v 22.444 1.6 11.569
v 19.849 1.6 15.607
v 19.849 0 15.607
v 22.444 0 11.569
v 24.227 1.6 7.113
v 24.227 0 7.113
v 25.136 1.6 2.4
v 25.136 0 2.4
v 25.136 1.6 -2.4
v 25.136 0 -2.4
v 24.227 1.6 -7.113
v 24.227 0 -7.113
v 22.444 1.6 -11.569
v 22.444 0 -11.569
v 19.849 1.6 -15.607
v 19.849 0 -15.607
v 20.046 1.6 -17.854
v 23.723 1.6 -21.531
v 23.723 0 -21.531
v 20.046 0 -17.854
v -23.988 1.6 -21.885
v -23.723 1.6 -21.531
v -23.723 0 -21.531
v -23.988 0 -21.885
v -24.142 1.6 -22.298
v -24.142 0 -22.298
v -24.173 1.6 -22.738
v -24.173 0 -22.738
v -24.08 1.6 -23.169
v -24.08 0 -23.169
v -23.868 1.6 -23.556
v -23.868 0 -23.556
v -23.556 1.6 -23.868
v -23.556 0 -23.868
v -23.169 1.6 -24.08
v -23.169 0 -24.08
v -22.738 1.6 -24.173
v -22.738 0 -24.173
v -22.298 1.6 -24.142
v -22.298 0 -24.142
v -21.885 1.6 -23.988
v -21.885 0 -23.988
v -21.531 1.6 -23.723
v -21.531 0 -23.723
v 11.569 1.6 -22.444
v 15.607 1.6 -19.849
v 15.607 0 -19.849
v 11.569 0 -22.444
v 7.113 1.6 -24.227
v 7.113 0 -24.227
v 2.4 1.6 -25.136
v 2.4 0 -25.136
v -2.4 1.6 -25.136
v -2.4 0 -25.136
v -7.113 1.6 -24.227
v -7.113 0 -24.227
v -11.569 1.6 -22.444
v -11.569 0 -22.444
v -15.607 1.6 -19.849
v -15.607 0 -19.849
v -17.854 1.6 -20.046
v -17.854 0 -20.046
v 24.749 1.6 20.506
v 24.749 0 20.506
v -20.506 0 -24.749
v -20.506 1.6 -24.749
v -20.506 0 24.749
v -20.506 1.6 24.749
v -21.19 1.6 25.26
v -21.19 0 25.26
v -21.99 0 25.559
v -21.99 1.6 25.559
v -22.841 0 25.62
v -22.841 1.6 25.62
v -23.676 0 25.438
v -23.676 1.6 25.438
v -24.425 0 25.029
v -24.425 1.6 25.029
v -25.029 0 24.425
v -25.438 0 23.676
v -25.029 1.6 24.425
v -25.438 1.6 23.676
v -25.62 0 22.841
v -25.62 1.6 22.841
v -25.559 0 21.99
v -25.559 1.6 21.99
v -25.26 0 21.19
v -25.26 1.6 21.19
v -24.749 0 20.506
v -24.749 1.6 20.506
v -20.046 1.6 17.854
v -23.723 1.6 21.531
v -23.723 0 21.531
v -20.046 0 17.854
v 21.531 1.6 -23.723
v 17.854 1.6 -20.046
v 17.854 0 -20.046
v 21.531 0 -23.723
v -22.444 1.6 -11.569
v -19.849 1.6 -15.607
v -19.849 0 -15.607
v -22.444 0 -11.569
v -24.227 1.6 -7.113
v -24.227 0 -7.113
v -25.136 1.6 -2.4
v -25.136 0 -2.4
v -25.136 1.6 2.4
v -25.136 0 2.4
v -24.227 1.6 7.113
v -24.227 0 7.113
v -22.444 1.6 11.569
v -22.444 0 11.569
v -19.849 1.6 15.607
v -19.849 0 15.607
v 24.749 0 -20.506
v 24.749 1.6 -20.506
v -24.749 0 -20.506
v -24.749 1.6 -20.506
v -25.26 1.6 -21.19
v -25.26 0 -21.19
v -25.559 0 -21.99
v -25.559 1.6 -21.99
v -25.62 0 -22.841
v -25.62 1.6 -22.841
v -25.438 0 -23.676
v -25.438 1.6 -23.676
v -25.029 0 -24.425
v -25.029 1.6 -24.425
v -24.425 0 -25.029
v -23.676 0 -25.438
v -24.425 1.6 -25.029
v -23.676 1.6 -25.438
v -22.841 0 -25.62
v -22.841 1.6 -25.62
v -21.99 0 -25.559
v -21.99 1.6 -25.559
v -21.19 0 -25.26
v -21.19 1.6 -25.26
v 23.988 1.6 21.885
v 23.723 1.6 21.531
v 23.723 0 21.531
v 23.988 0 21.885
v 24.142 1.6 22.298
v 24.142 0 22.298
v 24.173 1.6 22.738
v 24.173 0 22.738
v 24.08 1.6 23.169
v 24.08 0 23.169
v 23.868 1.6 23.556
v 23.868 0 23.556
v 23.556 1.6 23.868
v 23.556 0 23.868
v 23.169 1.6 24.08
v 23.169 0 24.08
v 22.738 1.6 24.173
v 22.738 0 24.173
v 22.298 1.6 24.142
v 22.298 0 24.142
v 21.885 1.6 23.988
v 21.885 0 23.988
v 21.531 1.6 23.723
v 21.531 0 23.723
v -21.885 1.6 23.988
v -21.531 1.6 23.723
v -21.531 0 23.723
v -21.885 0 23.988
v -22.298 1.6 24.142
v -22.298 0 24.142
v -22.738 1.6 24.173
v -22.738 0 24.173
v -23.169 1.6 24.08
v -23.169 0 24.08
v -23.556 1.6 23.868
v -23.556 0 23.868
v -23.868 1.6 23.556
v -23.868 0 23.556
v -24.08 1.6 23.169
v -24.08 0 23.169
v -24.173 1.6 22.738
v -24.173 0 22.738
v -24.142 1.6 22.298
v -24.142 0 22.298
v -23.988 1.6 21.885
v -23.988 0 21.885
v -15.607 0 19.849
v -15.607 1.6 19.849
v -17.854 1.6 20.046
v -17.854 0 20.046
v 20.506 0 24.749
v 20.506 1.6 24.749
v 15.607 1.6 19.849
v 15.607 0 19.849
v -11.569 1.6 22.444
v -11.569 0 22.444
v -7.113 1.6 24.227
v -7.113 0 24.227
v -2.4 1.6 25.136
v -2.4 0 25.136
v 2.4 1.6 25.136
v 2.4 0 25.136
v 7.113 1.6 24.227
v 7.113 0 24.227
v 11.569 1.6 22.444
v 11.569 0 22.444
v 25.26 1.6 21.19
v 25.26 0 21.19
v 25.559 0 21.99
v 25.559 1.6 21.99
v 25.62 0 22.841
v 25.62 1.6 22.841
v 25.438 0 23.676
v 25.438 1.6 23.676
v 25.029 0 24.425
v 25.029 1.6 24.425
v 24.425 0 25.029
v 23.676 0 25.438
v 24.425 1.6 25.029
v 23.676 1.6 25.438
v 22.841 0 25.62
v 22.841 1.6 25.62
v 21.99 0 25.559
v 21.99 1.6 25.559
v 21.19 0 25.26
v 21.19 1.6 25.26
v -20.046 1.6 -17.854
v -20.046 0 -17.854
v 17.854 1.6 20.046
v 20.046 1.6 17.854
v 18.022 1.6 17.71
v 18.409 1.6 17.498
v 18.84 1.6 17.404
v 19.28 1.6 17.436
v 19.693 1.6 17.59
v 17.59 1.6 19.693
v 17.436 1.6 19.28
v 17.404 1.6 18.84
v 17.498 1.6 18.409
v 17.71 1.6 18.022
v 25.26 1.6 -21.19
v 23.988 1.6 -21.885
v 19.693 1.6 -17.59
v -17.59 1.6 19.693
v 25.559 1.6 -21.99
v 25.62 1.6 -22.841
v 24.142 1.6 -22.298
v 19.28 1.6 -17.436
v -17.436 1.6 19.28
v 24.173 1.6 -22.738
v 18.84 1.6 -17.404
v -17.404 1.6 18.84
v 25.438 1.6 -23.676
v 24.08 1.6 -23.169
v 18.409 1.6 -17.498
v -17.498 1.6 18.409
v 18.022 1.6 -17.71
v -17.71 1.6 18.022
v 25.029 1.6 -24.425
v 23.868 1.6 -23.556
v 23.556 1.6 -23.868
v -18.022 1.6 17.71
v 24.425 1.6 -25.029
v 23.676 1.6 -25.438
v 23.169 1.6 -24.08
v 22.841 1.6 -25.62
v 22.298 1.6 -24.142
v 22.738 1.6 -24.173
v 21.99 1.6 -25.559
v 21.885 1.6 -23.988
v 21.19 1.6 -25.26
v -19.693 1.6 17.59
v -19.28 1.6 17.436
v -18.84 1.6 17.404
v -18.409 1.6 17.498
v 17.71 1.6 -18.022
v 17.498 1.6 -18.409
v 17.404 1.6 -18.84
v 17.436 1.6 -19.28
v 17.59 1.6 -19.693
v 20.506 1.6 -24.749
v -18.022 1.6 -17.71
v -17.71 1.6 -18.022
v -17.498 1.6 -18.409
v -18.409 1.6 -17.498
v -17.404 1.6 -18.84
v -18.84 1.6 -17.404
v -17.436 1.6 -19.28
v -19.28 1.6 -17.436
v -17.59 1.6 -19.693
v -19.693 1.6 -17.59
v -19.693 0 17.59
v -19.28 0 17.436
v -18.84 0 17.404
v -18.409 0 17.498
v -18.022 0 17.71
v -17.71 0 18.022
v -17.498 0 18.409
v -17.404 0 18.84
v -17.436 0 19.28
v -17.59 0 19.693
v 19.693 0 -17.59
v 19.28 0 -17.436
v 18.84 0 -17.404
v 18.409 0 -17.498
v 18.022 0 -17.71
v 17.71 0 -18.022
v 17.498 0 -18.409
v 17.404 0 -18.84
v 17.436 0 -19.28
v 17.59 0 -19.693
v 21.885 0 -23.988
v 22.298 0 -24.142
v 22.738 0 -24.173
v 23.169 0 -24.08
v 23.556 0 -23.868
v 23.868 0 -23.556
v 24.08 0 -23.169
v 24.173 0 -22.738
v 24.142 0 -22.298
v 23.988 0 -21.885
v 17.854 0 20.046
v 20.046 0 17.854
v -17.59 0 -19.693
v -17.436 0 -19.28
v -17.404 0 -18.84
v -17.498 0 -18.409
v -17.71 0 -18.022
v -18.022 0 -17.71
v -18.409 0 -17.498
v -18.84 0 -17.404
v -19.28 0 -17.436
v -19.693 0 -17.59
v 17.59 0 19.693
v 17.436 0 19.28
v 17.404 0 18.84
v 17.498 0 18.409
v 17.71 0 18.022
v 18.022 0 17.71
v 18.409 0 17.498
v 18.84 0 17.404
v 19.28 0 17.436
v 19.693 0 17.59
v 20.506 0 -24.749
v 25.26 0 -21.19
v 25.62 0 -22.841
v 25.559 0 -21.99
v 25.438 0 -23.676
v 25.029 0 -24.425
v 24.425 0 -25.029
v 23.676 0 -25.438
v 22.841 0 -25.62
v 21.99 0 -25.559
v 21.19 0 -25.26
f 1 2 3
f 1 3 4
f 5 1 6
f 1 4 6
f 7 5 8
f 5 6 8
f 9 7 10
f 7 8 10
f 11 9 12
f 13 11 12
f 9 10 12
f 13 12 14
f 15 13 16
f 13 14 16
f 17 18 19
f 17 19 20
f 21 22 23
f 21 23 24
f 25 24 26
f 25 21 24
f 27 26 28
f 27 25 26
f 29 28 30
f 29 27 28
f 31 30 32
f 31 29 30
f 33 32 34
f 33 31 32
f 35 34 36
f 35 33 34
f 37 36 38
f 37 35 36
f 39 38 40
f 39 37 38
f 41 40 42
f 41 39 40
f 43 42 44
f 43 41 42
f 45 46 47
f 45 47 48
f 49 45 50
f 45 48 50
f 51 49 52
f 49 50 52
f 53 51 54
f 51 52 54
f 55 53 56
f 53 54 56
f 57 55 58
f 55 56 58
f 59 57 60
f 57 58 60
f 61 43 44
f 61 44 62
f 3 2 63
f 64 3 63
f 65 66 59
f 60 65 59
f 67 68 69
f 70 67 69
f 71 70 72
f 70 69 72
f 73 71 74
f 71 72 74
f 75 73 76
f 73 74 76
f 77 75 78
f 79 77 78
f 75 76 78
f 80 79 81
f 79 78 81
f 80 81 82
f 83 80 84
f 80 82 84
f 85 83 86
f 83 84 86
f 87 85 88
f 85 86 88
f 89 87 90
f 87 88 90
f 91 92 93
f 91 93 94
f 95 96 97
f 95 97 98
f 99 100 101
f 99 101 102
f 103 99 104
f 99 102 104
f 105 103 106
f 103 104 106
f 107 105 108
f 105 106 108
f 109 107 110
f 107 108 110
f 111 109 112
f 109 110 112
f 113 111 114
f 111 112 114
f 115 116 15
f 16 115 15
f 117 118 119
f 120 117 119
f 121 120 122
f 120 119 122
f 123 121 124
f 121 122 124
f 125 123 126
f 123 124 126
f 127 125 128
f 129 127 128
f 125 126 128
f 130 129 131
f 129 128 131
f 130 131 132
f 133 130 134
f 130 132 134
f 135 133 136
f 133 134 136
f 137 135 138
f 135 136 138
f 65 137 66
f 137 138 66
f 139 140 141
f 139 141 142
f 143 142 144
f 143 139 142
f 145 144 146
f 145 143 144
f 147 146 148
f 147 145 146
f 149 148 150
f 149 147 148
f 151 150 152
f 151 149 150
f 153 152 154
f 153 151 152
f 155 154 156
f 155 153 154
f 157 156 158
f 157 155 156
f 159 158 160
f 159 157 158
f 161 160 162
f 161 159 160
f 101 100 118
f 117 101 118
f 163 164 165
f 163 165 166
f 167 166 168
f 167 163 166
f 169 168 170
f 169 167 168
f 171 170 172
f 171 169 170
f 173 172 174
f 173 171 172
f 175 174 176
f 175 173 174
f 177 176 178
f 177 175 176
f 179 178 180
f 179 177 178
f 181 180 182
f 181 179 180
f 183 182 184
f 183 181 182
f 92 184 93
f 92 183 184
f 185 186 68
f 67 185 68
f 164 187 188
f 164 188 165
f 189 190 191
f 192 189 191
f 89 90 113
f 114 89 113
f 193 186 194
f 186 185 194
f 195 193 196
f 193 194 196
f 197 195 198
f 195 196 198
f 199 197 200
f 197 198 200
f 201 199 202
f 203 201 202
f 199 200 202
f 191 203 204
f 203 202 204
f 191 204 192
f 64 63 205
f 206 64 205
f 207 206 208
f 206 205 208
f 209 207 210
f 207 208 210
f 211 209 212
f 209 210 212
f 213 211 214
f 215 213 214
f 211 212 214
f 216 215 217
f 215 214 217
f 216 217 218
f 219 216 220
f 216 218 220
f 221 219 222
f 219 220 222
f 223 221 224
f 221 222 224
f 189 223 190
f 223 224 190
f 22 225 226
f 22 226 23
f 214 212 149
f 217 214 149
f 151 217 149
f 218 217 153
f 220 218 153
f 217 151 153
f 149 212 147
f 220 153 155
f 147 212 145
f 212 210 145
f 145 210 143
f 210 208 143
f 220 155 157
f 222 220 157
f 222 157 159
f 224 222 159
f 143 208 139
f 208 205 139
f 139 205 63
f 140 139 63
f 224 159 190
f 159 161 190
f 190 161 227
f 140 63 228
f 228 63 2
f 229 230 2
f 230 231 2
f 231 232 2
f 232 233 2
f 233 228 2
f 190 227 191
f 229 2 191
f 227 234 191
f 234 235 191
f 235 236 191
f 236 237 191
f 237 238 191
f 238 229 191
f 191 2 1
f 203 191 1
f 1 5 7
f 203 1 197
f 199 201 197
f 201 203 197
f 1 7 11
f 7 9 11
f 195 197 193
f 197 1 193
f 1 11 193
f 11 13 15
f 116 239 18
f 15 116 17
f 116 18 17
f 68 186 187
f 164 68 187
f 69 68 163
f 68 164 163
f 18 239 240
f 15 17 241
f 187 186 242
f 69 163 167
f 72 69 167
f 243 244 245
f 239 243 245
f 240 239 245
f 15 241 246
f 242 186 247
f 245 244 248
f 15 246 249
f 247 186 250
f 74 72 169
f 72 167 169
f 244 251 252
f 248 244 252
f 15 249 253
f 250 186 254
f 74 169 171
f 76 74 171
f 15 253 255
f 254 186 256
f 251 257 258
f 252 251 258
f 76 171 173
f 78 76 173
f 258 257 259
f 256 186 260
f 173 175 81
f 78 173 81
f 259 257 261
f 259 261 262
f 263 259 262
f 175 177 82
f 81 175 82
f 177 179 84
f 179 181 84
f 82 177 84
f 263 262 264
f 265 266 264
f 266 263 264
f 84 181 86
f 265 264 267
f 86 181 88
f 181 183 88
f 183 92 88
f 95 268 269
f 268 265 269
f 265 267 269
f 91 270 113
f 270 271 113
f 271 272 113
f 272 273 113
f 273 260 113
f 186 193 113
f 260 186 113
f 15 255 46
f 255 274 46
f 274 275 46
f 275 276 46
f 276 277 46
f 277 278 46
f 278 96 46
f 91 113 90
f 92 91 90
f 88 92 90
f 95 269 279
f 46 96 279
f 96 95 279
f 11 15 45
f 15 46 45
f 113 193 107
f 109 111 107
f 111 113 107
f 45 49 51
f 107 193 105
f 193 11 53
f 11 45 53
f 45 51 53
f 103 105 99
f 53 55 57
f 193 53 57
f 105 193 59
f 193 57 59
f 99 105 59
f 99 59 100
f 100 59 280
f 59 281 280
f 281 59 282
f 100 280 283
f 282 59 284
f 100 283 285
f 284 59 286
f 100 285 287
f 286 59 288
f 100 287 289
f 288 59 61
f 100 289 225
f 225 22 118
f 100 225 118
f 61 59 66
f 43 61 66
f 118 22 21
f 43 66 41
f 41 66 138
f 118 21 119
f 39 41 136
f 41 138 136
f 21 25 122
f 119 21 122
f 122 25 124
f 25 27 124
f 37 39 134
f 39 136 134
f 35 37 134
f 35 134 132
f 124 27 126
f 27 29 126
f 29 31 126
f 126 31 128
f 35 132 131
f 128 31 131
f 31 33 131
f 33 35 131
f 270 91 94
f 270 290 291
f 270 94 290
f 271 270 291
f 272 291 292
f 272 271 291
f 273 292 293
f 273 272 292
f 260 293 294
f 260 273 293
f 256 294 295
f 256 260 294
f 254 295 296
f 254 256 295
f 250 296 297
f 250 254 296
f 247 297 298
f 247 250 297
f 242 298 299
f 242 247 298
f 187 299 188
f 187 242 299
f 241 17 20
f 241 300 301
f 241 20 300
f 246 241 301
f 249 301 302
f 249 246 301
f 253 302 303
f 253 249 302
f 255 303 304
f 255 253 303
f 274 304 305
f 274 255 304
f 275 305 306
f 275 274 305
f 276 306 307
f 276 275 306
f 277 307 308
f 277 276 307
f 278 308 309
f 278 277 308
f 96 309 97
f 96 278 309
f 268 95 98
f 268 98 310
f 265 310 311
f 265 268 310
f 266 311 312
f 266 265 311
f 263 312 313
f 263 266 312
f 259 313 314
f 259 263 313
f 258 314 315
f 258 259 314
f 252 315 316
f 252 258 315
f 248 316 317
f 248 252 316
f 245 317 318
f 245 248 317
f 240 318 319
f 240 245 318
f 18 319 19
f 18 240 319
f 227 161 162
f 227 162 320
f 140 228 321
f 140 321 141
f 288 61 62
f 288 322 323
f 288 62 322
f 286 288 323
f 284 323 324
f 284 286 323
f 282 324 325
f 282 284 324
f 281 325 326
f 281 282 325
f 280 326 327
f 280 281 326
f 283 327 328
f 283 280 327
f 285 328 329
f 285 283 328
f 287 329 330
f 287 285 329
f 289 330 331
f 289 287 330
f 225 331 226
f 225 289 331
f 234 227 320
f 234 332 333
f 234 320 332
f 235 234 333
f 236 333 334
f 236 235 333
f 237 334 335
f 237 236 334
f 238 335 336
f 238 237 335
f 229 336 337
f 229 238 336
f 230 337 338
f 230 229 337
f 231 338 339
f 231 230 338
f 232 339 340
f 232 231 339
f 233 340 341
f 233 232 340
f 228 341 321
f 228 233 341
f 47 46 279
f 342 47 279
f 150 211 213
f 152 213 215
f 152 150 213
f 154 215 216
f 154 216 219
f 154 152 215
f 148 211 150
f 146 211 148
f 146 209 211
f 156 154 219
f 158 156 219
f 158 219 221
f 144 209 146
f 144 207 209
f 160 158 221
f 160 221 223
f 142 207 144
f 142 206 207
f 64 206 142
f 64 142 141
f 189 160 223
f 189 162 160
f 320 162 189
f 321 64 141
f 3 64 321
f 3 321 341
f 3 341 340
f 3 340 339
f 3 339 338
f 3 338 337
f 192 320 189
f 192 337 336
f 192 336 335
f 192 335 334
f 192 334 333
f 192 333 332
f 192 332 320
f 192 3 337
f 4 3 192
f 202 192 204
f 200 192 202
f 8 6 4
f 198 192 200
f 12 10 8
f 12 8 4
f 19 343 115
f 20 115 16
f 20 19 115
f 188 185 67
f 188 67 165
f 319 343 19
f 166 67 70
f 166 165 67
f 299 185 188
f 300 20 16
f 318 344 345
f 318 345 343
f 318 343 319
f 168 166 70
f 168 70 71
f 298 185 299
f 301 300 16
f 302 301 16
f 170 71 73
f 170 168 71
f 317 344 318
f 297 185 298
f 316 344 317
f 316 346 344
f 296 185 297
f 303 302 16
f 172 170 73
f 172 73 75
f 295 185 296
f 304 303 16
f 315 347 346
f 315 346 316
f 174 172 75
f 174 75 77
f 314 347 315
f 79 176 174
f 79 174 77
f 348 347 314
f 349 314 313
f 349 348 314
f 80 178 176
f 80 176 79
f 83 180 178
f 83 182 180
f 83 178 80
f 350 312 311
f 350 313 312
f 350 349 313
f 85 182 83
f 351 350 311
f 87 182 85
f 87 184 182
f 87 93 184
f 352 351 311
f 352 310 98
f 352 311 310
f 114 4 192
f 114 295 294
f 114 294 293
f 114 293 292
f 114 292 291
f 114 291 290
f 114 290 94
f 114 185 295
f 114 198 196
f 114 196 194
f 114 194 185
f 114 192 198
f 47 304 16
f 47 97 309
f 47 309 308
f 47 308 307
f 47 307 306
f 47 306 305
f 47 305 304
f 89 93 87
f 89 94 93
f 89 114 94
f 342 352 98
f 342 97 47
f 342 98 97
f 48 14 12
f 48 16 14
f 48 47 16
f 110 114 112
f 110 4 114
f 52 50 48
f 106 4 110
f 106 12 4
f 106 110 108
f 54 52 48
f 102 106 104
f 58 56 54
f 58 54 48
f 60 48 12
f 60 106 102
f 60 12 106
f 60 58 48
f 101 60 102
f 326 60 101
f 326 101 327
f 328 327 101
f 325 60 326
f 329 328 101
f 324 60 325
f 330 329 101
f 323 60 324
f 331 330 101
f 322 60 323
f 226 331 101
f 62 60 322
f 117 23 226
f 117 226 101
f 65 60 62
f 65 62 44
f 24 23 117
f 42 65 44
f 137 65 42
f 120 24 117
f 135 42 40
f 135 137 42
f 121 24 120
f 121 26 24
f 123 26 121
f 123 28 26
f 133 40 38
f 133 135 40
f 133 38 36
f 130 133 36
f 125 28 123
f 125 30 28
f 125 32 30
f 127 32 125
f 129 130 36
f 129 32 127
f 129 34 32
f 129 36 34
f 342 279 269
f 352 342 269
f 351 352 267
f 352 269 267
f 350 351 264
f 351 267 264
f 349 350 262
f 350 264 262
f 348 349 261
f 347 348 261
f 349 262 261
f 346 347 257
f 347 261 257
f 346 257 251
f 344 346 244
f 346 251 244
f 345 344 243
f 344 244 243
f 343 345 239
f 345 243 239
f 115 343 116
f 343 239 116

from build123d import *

# Parameters (mm, degrees)
SKETCH_1_R      = 25.25
EXTRUDE_1_DEPTH = 1.6
EXTRUDE_2_DEPTH = 1.6


with BuildPart() as part:
    # 草图1 → 凸台-拉伸1 (new body)
    with BuildSketch(Plane(origin=(0, 0, 0), x_dir=(1, 0, 0), z_dir=(0, 1, 0))):
        with Locations(Location((0, 0, 0), (0, 0, 270))):
            Circle(SKETCH_1_R)
    extrude(amount=EXTRUDE_1_DEPTH)

    # 草图2 → 凸台-拉伸2 (add)
    with BuildSketch(Plane(origin=(0, 1.6, 0), x_dir=(1, 0, 0), z_dir=(0, 1, 0))):
        with BuildLine():
            Line((-20.506096654, 24.748737342), (0, 4.242640687))
            Line((0, 4.242640687), (20.506096654, 24.748737342))
            ThreePointArc((20.506096654, 24.748737342), (24.748737342, 24.748737342), (24.748737342, 20.506096654))
            Line((24.748737342, 20.506096654), (4.242640687, 0))
            Line((4.242640687, 0), (24.748737342, -20.506096654))
            ThreePointArc((24.748737342, -20.506096654), (24.748737342, -24.748737342), (20.506096654, -24.748737342))
            Line((20.506096654, -24.748737342), (0, -4.242640687))
            Line((0, -4.242640687), (-20.506096654, -24.748737342))
            ThreePointArc((-20.506096654, -24.748737342), (-24.748737342, -24.748737342), (-24.748737342, -20.506096654))
            Line((-24.748737342, -20.506096654), (-4.242640687, 0))
            Line((-4.242640687, 0), (-24.748737342, 20.506096654))
            ThreePointArc((-24.748737342, 20.506096654), (-24.748737342, 24.748737342), (-20.506096654, 24.748737342))
        make_face()
        with BuildLine():
            Line((-21.531401487, 23.723432509), (-17.854446225, 20.046477247))
            ThreePointArc((-17.854446225, 20.046477247), (-17.854446225, 17.854446225), (-20.046477247, 17.854446225))
            Line((-20.046477247, 17.854446225), (-23.723432509, 21.531401487))
            ThreePointArc((-23.723432509, 21.531401487), (-23.723432509, 23.723432509), (-21.531401487, 23.723432509))
        make_face(mode=Mode.SUBTRACT)
        with BuildLine():
            Line((23.723432509, 21.531401487), (20.046477247, 17.854446225))
            ThreePointArc((20.046477247, 17.854446225), (17.854446225, 17.854446225), (17.854446225, 20.046477247))
            Line((17.854446225, 20.046477247), (21.531401487, 23.723432509))
            ThreePointArc((21.531401487, 23.723432509), (23.723432509, 23.723432509), (23.723432509, 21.531401487))
        make_face(mode=Mode.SUBTRACT)
        with BuildLine():
            Line((21.531401487, -23.723432509), (17.854446225, -20.046477247))
            ThreePointArc((17.854446225, -20.046477247), (17.854446225, -17.854446225), (20.046477247, -17.854446225))
            Line((20.046477247, -17.854446225), (23.723432509, -21.531401487))
            ThreePointArc((23.723432509, -21.531401487), (23.723432509, -23.723432509), (21.531401487, -23.723432509))
        make_face(mode=Mode.SUBTRACT)
        with BuildLine():
            Line((-23.723432509, -21.531401487), (-20.046477247, -17.854446225))
            ThreePointArc((-20.046477247, -17.854446225), (-17.854446225, -17.854446225), (-17.854446225, -20.046477247))
            Line((-17.854446225, -20.046477247), (-21.531401487, -23.723432509))
            ThreePointArc((-21.531401487, -23.723432509), (-23.723432509, -23.723432509), (-23.723432509, -21.531401487))
        make_face(mode=Mode.SUBTRACT)
    extrude(amount=-EXTRUDE_2_DEPTH)


solid = part.part
